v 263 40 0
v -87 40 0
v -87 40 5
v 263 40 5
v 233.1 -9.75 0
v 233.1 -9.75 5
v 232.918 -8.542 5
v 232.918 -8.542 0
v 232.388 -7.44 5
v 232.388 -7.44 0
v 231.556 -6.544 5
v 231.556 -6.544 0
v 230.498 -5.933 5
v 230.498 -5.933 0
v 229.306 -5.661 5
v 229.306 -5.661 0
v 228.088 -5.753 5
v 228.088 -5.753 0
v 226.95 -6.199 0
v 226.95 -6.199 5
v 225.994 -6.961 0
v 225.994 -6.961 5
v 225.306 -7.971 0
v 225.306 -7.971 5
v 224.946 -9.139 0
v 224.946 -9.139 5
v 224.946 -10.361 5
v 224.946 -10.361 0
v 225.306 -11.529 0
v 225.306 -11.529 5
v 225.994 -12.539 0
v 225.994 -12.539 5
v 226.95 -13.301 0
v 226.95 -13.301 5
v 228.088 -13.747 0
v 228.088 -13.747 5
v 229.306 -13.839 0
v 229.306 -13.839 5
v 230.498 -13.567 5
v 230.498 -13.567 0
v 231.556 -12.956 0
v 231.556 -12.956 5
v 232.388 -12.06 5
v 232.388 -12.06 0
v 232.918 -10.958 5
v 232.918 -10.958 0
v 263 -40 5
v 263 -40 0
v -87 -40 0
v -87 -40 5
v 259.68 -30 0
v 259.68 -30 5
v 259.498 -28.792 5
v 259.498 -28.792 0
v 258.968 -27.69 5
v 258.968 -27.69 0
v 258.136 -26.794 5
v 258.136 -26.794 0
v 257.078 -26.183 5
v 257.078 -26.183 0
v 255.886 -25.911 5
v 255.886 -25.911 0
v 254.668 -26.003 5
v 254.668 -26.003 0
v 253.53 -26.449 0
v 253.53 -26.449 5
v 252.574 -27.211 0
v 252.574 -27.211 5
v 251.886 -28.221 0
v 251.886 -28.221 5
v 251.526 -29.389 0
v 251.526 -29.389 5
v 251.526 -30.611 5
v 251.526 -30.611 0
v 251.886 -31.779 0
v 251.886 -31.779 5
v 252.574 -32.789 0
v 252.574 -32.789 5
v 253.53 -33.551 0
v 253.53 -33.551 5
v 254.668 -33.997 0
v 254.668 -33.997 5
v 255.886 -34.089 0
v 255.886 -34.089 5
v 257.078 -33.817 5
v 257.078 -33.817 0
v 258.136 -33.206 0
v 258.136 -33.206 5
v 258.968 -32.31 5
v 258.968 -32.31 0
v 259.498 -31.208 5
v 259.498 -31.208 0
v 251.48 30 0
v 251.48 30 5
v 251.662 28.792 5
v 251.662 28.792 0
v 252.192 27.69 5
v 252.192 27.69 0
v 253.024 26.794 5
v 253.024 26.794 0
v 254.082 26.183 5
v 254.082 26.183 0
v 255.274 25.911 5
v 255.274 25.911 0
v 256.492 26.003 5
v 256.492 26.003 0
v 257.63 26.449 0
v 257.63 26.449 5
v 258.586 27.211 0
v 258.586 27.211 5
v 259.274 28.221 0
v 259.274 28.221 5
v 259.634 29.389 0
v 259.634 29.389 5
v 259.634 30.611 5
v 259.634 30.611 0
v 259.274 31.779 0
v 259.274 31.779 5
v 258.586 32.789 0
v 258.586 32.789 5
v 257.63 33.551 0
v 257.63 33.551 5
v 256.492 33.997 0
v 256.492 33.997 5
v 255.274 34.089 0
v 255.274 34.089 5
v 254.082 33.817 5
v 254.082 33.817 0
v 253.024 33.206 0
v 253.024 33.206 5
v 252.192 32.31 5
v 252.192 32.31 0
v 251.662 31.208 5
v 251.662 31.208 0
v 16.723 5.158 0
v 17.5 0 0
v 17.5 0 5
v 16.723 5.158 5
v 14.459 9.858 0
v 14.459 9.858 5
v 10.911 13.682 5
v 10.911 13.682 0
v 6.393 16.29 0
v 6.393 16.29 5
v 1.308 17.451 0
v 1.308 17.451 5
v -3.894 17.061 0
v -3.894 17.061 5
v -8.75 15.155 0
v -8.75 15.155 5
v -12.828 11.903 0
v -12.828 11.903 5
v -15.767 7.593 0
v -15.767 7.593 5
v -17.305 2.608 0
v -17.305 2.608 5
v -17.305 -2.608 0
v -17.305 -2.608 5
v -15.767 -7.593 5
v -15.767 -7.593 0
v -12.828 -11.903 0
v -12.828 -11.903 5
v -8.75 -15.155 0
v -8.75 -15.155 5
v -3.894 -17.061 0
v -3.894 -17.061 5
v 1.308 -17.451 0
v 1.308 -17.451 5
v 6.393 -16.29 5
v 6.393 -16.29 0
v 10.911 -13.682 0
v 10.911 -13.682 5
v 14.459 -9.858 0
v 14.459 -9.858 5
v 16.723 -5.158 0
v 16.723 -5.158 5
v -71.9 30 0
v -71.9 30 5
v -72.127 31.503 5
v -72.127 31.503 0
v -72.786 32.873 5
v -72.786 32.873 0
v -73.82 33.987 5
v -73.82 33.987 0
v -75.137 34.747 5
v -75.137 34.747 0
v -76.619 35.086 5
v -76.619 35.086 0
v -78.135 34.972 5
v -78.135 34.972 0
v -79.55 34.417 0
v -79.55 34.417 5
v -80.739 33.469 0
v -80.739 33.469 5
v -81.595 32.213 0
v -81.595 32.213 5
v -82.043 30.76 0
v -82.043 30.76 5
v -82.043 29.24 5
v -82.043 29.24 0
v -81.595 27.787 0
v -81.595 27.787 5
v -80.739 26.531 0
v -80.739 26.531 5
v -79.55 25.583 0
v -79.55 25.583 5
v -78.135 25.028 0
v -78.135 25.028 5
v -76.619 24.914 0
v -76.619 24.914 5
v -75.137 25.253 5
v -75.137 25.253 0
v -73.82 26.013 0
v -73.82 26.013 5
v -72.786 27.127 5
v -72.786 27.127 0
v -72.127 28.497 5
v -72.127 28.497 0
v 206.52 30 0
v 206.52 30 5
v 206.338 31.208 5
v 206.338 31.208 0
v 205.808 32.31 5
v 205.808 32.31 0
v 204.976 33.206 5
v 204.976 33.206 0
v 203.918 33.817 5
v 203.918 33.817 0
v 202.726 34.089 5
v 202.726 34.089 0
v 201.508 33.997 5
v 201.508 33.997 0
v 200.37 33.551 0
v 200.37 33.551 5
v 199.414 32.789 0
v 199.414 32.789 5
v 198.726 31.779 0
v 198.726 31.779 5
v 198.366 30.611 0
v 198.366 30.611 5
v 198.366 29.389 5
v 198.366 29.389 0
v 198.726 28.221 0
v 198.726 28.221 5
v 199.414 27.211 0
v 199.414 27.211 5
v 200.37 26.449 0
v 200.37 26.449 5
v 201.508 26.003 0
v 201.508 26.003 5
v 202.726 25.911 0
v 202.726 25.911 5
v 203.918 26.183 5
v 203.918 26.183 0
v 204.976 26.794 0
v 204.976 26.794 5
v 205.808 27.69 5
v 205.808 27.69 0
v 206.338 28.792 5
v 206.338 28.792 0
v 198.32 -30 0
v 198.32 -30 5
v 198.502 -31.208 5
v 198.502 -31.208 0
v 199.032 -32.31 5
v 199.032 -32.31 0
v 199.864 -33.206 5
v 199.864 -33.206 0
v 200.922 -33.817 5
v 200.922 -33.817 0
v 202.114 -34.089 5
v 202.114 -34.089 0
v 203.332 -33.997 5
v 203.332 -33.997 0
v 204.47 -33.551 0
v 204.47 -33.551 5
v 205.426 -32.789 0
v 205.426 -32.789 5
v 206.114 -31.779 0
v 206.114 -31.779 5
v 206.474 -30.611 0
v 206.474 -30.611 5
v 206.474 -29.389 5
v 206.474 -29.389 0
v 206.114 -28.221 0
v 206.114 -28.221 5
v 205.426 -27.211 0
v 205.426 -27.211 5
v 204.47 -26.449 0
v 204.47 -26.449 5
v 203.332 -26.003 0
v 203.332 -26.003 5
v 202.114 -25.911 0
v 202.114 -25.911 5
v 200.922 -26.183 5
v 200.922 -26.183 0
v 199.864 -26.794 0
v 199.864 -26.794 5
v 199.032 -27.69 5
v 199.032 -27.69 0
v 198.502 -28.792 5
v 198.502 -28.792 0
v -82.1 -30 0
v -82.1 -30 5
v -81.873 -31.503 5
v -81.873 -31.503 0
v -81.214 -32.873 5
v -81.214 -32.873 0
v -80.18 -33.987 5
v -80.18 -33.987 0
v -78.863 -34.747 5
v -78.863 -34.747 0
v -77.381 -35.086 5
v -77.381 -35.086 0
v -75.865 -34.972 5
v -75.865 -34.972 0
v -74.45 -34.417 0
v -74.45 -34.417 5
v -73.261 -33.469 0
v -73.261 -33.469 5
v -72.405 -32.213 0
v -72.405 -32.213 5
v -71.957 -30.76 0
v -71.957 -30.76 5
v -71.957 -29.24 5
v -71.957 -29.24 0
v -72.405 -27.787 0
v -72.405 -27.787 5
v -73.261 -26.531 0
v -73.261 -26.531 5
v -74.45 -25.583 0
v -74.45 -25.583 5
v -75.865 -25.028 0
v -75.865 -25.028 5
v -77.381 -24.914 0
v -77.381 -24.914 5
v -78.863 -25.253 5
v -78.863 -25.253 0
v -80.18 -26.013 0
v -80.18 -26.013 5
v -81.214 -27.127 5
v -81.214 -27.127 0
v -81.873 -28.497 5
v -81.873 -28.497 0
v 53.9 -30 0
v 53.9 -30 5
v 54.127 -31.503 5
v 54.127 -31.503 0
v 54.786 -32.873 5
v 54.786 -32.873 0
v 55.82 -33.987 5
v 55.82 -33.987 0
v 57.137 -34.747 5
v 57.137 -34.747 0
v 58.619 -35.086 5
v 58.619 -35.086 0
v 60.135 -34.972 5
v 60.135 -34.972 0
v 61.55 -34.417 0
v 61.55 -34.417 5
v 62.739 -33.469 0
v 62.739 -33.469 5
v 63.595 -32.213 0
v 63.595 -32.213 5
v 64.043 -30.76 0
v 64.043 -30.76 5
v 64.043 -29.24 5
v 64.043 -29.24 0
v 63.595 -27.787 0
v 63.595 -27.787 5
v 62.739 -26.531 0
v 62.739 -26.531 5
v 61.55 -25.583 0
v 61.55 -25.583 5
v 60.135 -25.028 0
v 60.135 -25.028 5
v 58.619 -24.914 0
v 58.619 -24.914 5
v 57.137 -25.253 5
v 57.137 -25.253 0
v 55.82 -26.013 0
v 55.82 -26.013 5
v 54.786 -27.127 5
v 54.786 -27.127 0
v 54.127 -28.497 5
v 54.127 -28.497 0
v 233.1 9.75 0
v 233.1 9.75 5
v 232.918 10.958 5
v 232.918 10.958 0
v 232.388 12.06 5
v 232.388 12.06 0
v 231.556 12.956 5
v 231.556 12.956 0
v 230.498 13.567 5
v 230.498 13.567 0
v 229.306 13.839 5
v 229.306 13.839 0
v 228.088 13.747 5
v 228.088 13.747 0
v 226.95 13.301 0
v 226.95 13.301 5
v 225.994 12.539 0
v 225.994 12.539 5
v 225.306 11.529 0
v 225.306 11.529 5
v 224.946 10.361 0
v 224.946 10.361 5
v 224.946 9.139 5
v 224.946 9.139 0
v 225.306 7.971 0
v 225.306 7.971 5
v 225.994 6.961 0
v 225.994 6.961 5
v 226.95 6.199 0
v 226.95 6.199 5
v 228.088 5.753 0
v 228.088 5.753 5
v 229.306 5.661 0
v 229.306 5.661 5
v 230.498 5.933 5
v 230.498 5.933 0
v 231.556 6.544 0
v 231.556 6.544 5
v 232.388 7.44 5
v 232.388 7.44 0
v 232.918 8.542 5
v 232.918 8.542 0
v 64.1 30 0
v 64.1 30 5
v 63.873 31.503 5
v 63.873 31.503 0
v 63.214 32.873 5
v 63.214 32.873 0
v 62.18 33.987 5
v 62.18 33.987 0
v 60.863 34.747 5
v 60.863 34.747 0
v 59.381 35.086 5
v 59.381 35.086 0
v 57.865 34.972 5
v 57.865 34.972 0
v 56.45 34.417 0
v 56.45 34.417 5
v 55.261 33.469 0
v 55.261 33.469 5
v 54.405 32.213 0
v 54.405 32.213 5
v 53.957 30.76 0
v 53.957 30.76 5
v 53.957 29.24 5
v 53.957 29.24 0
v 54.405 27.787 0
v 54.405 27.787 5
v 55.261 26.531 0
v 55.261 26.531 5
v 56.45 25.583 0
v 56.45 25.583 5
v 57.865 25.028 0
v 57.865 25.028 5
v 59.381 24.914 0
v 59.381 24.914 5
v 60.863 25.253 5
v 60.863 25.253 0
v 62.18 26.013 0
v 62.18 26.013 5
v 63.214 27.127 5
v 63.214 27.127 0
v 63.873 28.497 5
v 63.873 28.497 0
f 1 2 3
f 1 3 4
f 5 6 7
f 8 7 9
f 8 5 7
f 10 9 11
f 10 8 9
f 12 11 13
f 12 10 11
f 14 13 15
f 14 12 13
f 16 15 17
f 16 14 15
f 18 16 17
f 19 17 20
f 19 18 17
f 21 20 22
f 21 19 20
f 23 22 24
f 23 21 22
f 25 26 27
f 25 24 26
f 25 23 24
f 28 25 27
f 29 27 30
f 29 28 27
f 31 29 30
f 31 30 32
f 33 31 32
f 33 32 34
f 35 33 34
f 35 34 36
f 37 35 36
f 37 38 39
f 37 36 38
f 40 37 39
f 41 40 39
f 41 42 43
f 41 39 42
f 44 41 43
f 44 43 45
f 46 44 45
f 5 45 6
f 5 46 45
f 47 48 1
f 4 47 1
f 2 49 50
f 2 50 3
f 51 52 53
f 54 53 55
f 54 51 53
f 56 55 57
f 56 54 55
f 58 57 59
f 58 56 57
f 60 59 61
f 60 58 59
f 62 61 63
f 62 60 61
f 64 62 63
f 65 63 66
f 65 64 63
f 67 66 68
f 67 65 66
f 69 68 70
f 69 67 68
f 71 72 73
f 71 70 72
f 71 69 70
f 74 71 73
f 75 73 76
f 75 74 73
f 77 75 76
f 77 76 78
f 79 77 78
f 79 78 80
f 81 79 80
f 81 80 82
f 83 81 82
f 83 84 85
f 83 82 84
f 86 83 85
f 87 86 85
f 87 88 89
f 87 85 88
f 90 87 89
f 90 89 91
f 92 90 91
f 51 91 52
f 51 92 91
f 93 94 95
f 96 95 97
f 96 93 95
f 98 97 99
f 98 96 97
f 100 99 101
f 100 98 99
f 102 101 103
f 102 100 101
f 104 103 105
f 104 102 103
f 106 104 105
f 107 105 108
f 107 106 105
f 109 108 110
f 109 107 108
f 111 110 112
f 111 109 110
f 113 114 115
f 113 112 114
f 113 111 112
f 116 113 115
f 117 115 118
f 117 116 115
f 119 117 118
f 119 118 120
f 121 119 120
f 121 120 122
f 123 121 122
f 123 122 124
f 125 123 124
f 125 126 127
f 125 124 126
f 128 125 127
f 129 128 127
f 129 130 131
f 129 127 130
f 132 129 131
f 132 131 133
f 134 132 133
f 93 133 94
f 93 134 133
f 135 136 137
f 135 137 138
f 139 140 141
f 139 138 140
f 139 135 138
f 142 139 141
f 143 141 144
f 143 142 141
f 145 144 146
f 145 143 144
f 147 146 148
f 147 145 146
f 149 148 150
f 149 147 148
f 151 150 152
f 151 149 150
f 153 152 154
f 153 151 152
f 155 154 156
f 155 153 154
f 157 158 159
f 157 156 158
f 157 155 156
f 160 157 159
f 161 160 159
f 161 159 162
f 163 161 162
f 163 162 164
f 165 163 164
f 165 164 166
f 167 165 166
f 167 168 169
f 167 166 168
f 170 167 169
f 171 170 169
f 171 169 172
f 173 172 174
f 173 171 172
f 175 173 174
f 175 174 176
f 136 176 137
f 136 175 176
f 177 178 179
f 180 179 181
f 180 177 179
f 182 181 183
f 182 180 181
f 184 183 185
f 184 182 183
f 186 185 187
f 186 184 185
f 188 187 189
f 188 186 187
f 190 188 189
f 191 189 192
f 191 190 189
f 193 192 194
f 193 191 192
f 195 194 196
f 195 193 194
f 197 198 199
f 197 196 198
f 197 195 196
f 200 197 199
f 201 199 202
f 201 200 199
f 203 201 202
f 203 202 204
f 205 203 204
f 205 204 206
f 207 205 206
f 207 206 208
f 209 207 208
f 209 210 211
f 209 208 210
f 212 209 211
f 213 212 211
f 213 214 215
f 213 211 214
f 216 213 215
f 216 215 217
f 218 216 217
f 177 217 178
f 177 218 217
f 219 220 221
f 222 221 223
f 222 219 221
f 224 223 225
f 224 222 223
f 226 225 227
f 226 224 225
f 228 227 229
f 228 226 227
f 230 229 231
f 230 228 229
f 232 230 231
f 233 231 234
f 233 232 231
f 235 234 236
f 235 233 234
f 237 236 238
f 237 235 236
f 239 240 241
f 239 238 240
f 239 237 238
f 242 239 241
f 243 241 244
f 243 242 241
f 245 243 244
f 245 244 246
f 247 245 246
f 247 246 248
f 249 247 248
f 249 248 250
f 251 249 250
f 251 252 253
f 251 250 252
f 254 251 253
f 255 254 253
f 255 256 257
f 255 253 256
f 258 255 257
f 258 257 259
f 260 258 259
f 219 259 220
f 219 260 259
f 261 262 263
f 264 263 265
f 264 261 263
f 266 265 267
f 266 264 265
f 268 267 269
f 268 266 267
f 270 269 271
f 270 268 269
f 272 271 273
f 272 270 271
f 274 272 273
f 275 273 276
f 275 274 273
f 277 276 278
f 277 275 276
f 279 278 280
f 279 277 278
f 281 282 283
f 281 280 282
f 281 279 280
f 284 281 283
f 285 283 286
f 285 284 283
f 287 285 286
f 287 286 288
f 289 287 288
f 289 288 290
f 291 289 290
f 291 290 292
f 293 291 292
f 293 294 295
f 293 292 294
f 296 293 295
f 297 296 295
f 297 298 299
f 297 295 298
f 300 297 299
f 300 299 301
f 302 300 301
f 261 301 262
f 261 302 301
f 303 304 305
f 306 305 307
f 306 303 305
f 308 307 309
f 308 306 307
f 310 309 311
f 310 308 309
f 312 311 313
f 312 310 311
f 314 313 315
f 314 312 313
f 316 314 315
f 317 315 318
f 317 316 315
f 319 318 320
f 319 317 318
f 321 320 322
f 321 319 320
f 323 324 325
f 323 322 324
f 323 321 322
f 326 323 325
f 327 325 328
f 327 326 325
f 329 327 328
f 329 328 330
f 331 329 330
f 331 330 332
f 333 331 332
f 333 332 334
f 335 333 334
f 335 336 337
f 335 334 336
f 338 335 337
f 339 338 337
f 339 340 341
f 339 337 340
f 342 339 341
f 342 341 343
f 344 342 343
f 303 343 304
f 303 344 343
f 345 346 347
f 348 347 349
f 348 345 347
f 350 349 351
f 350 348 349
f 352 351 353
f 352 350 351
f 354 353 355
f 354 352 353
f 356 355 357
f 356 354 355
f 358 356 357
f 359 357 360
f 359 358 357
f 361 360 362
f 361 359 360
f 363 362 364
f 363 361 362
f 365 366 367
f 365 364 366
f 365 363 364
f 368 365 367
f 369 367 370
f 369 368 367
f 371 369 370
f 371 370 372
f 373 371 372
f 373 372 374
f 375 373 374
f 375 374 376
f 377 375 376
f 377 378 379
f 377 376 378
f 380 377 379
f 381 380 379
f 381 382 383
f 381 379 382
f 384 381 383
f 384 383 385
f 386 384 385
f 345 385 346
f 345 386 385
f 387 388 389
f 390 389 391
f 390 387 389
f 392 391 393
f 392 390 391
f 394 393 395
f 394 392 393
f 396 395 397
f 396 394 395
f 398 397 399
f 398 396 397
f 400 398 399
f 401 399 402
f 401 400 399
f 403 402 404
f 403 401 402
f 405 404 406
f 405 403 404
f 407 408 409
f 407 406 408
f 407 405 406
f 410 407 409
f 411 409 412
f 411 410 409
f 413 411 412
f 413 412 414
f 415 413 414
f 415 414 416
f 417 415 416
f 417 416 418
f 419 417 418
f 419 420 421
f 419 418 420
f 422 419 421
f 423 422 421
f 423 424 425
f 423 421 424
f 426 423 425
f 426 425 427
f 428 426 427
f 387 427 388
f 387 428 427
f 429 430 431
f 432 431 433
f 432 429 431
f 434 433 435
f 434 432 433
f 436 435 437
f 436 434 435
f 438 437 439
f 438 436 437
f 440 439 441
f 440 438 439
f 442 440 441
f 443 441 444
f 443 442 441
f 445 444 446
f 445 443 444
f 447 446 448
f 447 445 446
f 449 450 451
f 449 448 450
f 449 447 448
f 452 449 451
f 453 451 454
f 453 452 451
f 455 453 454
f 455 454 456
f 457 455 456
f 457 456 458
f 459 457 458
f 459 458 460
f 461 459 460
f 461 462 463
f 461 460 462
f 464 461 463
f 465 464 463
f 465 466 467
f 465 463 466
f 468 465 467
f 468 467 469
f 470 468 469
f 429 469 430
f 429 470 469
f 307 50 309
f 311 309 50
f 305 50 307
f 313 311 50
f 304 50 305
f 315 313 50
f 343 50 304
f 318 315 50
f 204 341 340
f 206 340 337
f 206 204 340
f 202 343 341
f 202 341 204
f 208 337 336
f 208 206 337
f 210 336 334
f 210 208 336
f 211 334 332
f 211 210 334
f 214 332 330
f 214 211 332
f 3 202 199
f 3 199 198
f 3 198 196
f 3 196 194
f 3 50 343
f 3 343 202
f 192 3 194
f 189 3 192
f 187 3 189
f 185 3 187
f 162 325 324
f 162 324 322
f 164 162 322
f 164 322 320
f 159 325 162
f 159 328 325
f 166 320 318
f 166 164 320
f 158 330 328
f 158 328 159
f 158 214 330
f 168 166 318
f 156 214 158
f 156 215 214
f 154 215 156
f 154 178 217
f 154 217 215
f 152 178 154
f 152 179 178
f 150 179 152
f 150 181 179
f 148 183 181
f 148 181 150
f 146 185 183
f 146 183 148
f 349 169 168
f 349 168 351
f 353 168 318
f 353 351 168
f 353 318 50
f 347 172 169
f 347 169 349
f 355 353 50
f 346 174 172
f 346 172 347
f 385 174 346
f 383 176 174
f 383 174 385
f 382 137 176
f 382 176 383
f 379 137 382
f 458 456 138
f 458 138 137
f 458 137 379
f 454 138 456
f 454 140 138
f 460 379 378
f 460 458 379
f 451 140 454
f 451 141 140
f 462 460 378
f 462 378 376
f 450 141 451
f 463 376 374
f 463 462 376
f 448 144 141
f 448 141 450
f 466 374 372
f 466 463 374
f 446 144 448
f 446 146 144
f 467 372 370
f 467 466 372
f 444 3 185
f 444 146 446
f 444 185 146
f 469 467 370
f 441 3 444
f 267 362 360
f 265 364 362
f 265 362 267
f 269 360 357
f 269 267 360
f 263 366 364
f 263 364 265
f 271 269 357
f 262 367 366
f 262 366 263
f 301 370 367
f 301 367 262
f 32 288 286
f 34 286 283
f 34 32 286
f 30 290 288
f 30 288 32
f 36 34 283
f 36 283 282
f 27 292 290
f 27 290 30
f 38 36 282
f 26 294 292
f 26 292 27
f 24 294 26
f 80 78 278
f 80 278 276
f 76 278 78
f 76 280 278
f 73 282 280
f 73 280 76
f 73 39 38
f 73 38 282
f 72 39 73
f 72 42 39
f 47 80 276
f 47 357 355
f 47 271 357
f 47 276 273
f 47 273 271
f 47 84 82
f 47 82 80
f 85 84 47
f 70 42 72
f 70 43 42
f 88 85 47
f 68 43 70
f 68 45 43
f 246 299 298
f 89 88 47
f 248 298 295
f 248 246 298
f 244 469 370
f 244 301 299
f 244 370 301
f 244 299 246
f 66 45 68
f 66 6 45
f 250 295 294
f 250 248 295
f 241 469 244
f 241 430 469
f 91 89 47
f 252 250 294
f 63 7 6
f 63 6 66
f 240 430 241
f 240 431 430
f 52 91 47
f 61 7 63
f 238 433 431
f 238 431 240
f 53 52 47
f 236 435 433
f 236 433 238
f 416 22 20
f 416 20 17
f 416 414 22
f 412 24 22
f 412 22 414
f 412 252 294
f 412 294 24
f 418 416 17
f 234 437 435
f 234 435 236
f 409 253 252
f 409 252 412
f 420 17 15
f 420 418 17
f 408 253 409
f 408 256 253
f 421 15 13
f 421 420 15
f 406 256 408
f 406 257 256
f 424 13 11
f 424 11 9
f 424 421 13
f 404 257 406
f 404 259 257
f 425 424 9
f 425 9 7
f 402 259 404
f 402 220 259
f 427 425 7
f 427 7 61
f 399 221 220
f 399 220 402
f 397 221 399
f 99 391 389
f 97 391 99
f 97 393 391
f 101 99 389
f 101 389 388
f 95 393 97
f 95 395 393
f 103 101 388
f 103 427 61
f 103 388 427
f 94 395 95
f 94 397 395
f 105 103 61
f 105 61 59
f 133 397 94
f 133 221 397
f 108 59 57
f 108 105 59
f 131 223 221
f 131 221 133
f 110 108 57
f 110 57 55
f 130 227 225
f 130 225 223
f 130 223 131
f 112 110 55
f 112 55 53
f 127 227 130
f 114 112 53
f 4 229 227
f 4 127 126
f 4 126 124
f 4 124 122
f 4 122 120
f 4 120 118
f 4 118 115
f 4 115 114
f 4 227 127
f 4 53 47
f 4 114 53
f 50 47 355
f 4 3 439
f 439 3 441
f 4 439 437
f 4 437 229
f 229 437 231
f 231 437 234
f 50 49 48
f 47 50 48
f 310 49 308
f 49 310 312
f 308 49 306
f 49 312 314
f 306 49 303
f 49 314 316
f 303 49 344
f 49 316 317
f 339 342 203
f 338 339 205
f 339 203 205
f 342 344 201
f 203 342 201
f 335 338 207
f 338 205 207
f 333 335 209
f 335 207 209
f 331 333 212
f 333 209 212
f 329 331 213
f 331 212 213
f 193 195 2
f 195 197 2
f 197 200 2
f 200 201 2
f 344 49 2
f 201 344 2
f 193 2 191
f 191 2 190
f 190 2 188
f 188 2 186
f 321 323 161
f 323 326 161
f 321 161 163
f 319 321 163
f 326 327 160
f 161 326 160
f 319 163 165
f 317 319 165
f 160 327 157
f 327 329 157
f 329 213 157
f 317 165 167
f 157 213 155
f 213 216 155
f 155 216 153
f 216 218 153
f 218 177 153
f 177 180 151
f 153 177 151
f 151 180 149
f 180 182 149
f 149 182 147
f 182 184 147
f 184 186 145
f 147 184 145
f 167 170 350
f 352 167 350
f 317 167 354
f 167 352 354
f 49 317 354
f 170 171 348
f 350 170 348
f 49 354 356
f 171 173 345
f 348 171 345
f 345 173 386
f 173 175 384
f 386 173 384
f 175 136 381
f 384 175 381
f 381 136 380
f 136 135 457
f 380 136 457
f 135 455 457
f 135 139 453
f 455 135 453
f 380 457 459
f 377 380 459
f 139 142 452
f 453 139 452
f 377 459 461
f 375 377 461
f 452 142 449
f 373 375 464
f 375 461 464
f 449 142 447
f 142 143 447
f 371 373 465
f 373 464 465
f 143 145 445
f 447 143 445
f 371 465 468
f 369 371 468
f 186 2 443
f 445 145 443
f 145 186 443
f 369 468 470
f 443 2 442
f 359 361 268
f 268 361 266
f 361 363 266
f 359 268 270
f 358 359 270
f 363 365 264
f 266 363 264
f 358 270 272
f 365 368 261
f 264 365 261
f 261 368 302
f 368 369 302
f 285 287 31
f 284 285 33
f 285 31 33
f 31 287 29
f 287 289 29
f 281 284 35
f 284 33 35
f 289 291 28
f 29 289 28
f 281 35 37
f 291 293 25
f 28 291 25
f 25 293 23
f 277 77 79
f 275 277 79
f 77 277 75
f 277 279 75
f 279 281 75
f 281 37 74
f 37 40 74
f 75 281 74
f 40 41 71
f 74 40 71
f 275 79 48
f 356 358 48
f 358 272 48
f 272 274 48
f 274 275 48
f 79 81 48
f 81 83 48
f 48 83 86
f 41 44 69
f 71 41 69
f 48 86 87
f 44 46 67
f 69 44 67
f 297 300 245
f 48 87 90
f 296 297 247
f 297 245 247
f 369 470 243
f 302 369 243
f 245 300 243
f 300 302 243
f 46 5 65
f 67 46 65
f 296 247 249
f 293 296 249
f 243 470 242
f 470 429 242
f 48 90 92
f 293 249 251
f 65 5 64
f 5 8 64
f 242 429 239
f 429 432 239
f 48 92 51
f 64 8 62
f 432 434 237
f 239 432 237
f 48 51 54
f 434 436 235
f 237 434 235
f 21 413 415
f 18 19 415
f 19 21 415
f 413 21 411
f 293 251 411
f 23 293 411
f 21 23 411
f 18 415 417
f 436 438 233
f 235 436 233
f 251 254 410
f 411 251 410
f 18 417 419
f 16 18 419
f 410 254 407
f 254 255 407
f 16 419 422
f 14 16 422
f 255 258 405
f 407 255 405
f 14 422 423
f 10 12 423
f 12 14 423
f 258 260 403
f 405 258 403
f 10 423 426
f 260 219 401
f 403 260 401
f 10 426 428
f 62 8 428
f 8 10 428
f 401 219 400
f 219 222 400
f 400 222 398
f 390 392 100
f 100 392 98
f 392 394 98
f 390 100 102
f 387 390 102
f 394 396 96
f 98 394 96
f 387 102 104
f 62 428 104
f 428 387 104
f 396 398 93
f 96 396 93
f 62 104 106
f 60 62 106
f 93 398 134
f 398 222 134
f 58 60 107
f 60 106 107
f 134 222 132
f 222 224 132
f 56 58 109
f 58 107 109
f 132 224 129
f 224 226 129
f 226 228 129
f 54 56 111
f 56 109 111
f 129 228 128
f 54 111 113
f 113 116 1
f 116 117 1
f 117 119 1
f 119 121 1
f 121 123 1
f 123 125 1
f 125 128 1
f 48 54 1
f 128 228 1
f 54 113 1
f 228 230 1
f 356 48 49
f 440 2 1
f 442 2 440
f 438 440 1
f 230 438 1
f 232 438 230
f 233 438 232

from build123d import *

# Parameters (mm, degrees)
SKETCH1_W           = 350
SKETCH1_H           = 80
BOSS_EXTRUDE1_DEPTH = 5
SKETCH2_R           = 17.5
CUT_EXTRUDE1_DEPTH  = 60
SKETCH3_R           = 5.1
CUT_EXTRUDE2_DEPTH  = 10
SKETCH5_R           = 4.1
CUT_EXTRUDE3_DEPTH  = 267.071418984
SKETCH7_R           = 4.1
CUT_EXTRUDE5_DEPTH  = 267.071418984


with BuildPart() as part:
    # Sketch1 → Boss-Extrude1 (new body)
    with BuildSketch(Plane.XY):
        with Locations((88, 0)):
            Rectangle(SKETCH1_W, SKETCH1_H)
    extrude(amount=BOSS_EXTRUDE1_DEPTH)

    # Sketch2 → Cut-Extrude1 (cut)
    with BuildSketch(Plane(origin=(211.325798344, -35.262222233, -13.242737988), x_dir=(1, 0, 0), z_dir=(0, 0, 1))):
        with Locations((-211.325798344, 35.262222233)):
            Circle(SKETCH2_R)
    extrude(amount=CUT_EXTRUDE1_DEPTH, mode=Mode.SUBTRACT)

    # Sketch3 → Cut-Extrude2 (cut)
    with BuildSketch(Plane(origin=(20.819518943, -63.639721452, 0), x_dir=(1, 0, 0), z_dir=(0, 0, 1))):
        with Locations((-97.819518943, 93.639721452)):
            Circle(SKETCH3_R)
        with Locations(Location((38.180481057, 33.639721452, 0), (0, 0, 180))):
            Circle(SKETCH3_R)
        with Locations((38.180481057, 93.639721452)):
            Circle(SKETCH3_R)
        with Locations(Location((-97.819518943, 33.639721452, 0), (0, 0, 180))):
            Circle(SKETCH3_R)
    extrude(amount=CUT_EXTRUDE2_DEPTH, mode=Mode.SUBTRACT)

    # Sketch5 → Cut-Extrude3 (cut, through all)
    with BuildSketch(Plane.XY):
        with Locations((229, 9.75)):
            Circle(SKETCH5_R)
        with Locations((229, -9.75)):
            Circle(SKETCH5_R)
    extrude(amount=CUT_EXTRUDE3_DEPTH, mode=Mode.SUBTRACT)

    # Sketch7 → Cut-Extrude5 (cut, through all)
    with BuildSketch(Plane.XY):
        with Locations((202.42, 30)):
            Circle(SKETCH7_R)
        with Locations(Location((202.42, -30, 0), (0, 0, 180))):
            Circle(SKETCH7_R)
        with Locations((255.58, -30)):
            Circle(SKETCH7_R)
        with Locations(Location((255.58, 30, 0), (0, 0, 180))):
            Circle(SKETCH7_R)
    extrude(amount=CUT_EXTRUDE5_DEPTH, mode=Mode.SUBTRACT)


solid = part.part
